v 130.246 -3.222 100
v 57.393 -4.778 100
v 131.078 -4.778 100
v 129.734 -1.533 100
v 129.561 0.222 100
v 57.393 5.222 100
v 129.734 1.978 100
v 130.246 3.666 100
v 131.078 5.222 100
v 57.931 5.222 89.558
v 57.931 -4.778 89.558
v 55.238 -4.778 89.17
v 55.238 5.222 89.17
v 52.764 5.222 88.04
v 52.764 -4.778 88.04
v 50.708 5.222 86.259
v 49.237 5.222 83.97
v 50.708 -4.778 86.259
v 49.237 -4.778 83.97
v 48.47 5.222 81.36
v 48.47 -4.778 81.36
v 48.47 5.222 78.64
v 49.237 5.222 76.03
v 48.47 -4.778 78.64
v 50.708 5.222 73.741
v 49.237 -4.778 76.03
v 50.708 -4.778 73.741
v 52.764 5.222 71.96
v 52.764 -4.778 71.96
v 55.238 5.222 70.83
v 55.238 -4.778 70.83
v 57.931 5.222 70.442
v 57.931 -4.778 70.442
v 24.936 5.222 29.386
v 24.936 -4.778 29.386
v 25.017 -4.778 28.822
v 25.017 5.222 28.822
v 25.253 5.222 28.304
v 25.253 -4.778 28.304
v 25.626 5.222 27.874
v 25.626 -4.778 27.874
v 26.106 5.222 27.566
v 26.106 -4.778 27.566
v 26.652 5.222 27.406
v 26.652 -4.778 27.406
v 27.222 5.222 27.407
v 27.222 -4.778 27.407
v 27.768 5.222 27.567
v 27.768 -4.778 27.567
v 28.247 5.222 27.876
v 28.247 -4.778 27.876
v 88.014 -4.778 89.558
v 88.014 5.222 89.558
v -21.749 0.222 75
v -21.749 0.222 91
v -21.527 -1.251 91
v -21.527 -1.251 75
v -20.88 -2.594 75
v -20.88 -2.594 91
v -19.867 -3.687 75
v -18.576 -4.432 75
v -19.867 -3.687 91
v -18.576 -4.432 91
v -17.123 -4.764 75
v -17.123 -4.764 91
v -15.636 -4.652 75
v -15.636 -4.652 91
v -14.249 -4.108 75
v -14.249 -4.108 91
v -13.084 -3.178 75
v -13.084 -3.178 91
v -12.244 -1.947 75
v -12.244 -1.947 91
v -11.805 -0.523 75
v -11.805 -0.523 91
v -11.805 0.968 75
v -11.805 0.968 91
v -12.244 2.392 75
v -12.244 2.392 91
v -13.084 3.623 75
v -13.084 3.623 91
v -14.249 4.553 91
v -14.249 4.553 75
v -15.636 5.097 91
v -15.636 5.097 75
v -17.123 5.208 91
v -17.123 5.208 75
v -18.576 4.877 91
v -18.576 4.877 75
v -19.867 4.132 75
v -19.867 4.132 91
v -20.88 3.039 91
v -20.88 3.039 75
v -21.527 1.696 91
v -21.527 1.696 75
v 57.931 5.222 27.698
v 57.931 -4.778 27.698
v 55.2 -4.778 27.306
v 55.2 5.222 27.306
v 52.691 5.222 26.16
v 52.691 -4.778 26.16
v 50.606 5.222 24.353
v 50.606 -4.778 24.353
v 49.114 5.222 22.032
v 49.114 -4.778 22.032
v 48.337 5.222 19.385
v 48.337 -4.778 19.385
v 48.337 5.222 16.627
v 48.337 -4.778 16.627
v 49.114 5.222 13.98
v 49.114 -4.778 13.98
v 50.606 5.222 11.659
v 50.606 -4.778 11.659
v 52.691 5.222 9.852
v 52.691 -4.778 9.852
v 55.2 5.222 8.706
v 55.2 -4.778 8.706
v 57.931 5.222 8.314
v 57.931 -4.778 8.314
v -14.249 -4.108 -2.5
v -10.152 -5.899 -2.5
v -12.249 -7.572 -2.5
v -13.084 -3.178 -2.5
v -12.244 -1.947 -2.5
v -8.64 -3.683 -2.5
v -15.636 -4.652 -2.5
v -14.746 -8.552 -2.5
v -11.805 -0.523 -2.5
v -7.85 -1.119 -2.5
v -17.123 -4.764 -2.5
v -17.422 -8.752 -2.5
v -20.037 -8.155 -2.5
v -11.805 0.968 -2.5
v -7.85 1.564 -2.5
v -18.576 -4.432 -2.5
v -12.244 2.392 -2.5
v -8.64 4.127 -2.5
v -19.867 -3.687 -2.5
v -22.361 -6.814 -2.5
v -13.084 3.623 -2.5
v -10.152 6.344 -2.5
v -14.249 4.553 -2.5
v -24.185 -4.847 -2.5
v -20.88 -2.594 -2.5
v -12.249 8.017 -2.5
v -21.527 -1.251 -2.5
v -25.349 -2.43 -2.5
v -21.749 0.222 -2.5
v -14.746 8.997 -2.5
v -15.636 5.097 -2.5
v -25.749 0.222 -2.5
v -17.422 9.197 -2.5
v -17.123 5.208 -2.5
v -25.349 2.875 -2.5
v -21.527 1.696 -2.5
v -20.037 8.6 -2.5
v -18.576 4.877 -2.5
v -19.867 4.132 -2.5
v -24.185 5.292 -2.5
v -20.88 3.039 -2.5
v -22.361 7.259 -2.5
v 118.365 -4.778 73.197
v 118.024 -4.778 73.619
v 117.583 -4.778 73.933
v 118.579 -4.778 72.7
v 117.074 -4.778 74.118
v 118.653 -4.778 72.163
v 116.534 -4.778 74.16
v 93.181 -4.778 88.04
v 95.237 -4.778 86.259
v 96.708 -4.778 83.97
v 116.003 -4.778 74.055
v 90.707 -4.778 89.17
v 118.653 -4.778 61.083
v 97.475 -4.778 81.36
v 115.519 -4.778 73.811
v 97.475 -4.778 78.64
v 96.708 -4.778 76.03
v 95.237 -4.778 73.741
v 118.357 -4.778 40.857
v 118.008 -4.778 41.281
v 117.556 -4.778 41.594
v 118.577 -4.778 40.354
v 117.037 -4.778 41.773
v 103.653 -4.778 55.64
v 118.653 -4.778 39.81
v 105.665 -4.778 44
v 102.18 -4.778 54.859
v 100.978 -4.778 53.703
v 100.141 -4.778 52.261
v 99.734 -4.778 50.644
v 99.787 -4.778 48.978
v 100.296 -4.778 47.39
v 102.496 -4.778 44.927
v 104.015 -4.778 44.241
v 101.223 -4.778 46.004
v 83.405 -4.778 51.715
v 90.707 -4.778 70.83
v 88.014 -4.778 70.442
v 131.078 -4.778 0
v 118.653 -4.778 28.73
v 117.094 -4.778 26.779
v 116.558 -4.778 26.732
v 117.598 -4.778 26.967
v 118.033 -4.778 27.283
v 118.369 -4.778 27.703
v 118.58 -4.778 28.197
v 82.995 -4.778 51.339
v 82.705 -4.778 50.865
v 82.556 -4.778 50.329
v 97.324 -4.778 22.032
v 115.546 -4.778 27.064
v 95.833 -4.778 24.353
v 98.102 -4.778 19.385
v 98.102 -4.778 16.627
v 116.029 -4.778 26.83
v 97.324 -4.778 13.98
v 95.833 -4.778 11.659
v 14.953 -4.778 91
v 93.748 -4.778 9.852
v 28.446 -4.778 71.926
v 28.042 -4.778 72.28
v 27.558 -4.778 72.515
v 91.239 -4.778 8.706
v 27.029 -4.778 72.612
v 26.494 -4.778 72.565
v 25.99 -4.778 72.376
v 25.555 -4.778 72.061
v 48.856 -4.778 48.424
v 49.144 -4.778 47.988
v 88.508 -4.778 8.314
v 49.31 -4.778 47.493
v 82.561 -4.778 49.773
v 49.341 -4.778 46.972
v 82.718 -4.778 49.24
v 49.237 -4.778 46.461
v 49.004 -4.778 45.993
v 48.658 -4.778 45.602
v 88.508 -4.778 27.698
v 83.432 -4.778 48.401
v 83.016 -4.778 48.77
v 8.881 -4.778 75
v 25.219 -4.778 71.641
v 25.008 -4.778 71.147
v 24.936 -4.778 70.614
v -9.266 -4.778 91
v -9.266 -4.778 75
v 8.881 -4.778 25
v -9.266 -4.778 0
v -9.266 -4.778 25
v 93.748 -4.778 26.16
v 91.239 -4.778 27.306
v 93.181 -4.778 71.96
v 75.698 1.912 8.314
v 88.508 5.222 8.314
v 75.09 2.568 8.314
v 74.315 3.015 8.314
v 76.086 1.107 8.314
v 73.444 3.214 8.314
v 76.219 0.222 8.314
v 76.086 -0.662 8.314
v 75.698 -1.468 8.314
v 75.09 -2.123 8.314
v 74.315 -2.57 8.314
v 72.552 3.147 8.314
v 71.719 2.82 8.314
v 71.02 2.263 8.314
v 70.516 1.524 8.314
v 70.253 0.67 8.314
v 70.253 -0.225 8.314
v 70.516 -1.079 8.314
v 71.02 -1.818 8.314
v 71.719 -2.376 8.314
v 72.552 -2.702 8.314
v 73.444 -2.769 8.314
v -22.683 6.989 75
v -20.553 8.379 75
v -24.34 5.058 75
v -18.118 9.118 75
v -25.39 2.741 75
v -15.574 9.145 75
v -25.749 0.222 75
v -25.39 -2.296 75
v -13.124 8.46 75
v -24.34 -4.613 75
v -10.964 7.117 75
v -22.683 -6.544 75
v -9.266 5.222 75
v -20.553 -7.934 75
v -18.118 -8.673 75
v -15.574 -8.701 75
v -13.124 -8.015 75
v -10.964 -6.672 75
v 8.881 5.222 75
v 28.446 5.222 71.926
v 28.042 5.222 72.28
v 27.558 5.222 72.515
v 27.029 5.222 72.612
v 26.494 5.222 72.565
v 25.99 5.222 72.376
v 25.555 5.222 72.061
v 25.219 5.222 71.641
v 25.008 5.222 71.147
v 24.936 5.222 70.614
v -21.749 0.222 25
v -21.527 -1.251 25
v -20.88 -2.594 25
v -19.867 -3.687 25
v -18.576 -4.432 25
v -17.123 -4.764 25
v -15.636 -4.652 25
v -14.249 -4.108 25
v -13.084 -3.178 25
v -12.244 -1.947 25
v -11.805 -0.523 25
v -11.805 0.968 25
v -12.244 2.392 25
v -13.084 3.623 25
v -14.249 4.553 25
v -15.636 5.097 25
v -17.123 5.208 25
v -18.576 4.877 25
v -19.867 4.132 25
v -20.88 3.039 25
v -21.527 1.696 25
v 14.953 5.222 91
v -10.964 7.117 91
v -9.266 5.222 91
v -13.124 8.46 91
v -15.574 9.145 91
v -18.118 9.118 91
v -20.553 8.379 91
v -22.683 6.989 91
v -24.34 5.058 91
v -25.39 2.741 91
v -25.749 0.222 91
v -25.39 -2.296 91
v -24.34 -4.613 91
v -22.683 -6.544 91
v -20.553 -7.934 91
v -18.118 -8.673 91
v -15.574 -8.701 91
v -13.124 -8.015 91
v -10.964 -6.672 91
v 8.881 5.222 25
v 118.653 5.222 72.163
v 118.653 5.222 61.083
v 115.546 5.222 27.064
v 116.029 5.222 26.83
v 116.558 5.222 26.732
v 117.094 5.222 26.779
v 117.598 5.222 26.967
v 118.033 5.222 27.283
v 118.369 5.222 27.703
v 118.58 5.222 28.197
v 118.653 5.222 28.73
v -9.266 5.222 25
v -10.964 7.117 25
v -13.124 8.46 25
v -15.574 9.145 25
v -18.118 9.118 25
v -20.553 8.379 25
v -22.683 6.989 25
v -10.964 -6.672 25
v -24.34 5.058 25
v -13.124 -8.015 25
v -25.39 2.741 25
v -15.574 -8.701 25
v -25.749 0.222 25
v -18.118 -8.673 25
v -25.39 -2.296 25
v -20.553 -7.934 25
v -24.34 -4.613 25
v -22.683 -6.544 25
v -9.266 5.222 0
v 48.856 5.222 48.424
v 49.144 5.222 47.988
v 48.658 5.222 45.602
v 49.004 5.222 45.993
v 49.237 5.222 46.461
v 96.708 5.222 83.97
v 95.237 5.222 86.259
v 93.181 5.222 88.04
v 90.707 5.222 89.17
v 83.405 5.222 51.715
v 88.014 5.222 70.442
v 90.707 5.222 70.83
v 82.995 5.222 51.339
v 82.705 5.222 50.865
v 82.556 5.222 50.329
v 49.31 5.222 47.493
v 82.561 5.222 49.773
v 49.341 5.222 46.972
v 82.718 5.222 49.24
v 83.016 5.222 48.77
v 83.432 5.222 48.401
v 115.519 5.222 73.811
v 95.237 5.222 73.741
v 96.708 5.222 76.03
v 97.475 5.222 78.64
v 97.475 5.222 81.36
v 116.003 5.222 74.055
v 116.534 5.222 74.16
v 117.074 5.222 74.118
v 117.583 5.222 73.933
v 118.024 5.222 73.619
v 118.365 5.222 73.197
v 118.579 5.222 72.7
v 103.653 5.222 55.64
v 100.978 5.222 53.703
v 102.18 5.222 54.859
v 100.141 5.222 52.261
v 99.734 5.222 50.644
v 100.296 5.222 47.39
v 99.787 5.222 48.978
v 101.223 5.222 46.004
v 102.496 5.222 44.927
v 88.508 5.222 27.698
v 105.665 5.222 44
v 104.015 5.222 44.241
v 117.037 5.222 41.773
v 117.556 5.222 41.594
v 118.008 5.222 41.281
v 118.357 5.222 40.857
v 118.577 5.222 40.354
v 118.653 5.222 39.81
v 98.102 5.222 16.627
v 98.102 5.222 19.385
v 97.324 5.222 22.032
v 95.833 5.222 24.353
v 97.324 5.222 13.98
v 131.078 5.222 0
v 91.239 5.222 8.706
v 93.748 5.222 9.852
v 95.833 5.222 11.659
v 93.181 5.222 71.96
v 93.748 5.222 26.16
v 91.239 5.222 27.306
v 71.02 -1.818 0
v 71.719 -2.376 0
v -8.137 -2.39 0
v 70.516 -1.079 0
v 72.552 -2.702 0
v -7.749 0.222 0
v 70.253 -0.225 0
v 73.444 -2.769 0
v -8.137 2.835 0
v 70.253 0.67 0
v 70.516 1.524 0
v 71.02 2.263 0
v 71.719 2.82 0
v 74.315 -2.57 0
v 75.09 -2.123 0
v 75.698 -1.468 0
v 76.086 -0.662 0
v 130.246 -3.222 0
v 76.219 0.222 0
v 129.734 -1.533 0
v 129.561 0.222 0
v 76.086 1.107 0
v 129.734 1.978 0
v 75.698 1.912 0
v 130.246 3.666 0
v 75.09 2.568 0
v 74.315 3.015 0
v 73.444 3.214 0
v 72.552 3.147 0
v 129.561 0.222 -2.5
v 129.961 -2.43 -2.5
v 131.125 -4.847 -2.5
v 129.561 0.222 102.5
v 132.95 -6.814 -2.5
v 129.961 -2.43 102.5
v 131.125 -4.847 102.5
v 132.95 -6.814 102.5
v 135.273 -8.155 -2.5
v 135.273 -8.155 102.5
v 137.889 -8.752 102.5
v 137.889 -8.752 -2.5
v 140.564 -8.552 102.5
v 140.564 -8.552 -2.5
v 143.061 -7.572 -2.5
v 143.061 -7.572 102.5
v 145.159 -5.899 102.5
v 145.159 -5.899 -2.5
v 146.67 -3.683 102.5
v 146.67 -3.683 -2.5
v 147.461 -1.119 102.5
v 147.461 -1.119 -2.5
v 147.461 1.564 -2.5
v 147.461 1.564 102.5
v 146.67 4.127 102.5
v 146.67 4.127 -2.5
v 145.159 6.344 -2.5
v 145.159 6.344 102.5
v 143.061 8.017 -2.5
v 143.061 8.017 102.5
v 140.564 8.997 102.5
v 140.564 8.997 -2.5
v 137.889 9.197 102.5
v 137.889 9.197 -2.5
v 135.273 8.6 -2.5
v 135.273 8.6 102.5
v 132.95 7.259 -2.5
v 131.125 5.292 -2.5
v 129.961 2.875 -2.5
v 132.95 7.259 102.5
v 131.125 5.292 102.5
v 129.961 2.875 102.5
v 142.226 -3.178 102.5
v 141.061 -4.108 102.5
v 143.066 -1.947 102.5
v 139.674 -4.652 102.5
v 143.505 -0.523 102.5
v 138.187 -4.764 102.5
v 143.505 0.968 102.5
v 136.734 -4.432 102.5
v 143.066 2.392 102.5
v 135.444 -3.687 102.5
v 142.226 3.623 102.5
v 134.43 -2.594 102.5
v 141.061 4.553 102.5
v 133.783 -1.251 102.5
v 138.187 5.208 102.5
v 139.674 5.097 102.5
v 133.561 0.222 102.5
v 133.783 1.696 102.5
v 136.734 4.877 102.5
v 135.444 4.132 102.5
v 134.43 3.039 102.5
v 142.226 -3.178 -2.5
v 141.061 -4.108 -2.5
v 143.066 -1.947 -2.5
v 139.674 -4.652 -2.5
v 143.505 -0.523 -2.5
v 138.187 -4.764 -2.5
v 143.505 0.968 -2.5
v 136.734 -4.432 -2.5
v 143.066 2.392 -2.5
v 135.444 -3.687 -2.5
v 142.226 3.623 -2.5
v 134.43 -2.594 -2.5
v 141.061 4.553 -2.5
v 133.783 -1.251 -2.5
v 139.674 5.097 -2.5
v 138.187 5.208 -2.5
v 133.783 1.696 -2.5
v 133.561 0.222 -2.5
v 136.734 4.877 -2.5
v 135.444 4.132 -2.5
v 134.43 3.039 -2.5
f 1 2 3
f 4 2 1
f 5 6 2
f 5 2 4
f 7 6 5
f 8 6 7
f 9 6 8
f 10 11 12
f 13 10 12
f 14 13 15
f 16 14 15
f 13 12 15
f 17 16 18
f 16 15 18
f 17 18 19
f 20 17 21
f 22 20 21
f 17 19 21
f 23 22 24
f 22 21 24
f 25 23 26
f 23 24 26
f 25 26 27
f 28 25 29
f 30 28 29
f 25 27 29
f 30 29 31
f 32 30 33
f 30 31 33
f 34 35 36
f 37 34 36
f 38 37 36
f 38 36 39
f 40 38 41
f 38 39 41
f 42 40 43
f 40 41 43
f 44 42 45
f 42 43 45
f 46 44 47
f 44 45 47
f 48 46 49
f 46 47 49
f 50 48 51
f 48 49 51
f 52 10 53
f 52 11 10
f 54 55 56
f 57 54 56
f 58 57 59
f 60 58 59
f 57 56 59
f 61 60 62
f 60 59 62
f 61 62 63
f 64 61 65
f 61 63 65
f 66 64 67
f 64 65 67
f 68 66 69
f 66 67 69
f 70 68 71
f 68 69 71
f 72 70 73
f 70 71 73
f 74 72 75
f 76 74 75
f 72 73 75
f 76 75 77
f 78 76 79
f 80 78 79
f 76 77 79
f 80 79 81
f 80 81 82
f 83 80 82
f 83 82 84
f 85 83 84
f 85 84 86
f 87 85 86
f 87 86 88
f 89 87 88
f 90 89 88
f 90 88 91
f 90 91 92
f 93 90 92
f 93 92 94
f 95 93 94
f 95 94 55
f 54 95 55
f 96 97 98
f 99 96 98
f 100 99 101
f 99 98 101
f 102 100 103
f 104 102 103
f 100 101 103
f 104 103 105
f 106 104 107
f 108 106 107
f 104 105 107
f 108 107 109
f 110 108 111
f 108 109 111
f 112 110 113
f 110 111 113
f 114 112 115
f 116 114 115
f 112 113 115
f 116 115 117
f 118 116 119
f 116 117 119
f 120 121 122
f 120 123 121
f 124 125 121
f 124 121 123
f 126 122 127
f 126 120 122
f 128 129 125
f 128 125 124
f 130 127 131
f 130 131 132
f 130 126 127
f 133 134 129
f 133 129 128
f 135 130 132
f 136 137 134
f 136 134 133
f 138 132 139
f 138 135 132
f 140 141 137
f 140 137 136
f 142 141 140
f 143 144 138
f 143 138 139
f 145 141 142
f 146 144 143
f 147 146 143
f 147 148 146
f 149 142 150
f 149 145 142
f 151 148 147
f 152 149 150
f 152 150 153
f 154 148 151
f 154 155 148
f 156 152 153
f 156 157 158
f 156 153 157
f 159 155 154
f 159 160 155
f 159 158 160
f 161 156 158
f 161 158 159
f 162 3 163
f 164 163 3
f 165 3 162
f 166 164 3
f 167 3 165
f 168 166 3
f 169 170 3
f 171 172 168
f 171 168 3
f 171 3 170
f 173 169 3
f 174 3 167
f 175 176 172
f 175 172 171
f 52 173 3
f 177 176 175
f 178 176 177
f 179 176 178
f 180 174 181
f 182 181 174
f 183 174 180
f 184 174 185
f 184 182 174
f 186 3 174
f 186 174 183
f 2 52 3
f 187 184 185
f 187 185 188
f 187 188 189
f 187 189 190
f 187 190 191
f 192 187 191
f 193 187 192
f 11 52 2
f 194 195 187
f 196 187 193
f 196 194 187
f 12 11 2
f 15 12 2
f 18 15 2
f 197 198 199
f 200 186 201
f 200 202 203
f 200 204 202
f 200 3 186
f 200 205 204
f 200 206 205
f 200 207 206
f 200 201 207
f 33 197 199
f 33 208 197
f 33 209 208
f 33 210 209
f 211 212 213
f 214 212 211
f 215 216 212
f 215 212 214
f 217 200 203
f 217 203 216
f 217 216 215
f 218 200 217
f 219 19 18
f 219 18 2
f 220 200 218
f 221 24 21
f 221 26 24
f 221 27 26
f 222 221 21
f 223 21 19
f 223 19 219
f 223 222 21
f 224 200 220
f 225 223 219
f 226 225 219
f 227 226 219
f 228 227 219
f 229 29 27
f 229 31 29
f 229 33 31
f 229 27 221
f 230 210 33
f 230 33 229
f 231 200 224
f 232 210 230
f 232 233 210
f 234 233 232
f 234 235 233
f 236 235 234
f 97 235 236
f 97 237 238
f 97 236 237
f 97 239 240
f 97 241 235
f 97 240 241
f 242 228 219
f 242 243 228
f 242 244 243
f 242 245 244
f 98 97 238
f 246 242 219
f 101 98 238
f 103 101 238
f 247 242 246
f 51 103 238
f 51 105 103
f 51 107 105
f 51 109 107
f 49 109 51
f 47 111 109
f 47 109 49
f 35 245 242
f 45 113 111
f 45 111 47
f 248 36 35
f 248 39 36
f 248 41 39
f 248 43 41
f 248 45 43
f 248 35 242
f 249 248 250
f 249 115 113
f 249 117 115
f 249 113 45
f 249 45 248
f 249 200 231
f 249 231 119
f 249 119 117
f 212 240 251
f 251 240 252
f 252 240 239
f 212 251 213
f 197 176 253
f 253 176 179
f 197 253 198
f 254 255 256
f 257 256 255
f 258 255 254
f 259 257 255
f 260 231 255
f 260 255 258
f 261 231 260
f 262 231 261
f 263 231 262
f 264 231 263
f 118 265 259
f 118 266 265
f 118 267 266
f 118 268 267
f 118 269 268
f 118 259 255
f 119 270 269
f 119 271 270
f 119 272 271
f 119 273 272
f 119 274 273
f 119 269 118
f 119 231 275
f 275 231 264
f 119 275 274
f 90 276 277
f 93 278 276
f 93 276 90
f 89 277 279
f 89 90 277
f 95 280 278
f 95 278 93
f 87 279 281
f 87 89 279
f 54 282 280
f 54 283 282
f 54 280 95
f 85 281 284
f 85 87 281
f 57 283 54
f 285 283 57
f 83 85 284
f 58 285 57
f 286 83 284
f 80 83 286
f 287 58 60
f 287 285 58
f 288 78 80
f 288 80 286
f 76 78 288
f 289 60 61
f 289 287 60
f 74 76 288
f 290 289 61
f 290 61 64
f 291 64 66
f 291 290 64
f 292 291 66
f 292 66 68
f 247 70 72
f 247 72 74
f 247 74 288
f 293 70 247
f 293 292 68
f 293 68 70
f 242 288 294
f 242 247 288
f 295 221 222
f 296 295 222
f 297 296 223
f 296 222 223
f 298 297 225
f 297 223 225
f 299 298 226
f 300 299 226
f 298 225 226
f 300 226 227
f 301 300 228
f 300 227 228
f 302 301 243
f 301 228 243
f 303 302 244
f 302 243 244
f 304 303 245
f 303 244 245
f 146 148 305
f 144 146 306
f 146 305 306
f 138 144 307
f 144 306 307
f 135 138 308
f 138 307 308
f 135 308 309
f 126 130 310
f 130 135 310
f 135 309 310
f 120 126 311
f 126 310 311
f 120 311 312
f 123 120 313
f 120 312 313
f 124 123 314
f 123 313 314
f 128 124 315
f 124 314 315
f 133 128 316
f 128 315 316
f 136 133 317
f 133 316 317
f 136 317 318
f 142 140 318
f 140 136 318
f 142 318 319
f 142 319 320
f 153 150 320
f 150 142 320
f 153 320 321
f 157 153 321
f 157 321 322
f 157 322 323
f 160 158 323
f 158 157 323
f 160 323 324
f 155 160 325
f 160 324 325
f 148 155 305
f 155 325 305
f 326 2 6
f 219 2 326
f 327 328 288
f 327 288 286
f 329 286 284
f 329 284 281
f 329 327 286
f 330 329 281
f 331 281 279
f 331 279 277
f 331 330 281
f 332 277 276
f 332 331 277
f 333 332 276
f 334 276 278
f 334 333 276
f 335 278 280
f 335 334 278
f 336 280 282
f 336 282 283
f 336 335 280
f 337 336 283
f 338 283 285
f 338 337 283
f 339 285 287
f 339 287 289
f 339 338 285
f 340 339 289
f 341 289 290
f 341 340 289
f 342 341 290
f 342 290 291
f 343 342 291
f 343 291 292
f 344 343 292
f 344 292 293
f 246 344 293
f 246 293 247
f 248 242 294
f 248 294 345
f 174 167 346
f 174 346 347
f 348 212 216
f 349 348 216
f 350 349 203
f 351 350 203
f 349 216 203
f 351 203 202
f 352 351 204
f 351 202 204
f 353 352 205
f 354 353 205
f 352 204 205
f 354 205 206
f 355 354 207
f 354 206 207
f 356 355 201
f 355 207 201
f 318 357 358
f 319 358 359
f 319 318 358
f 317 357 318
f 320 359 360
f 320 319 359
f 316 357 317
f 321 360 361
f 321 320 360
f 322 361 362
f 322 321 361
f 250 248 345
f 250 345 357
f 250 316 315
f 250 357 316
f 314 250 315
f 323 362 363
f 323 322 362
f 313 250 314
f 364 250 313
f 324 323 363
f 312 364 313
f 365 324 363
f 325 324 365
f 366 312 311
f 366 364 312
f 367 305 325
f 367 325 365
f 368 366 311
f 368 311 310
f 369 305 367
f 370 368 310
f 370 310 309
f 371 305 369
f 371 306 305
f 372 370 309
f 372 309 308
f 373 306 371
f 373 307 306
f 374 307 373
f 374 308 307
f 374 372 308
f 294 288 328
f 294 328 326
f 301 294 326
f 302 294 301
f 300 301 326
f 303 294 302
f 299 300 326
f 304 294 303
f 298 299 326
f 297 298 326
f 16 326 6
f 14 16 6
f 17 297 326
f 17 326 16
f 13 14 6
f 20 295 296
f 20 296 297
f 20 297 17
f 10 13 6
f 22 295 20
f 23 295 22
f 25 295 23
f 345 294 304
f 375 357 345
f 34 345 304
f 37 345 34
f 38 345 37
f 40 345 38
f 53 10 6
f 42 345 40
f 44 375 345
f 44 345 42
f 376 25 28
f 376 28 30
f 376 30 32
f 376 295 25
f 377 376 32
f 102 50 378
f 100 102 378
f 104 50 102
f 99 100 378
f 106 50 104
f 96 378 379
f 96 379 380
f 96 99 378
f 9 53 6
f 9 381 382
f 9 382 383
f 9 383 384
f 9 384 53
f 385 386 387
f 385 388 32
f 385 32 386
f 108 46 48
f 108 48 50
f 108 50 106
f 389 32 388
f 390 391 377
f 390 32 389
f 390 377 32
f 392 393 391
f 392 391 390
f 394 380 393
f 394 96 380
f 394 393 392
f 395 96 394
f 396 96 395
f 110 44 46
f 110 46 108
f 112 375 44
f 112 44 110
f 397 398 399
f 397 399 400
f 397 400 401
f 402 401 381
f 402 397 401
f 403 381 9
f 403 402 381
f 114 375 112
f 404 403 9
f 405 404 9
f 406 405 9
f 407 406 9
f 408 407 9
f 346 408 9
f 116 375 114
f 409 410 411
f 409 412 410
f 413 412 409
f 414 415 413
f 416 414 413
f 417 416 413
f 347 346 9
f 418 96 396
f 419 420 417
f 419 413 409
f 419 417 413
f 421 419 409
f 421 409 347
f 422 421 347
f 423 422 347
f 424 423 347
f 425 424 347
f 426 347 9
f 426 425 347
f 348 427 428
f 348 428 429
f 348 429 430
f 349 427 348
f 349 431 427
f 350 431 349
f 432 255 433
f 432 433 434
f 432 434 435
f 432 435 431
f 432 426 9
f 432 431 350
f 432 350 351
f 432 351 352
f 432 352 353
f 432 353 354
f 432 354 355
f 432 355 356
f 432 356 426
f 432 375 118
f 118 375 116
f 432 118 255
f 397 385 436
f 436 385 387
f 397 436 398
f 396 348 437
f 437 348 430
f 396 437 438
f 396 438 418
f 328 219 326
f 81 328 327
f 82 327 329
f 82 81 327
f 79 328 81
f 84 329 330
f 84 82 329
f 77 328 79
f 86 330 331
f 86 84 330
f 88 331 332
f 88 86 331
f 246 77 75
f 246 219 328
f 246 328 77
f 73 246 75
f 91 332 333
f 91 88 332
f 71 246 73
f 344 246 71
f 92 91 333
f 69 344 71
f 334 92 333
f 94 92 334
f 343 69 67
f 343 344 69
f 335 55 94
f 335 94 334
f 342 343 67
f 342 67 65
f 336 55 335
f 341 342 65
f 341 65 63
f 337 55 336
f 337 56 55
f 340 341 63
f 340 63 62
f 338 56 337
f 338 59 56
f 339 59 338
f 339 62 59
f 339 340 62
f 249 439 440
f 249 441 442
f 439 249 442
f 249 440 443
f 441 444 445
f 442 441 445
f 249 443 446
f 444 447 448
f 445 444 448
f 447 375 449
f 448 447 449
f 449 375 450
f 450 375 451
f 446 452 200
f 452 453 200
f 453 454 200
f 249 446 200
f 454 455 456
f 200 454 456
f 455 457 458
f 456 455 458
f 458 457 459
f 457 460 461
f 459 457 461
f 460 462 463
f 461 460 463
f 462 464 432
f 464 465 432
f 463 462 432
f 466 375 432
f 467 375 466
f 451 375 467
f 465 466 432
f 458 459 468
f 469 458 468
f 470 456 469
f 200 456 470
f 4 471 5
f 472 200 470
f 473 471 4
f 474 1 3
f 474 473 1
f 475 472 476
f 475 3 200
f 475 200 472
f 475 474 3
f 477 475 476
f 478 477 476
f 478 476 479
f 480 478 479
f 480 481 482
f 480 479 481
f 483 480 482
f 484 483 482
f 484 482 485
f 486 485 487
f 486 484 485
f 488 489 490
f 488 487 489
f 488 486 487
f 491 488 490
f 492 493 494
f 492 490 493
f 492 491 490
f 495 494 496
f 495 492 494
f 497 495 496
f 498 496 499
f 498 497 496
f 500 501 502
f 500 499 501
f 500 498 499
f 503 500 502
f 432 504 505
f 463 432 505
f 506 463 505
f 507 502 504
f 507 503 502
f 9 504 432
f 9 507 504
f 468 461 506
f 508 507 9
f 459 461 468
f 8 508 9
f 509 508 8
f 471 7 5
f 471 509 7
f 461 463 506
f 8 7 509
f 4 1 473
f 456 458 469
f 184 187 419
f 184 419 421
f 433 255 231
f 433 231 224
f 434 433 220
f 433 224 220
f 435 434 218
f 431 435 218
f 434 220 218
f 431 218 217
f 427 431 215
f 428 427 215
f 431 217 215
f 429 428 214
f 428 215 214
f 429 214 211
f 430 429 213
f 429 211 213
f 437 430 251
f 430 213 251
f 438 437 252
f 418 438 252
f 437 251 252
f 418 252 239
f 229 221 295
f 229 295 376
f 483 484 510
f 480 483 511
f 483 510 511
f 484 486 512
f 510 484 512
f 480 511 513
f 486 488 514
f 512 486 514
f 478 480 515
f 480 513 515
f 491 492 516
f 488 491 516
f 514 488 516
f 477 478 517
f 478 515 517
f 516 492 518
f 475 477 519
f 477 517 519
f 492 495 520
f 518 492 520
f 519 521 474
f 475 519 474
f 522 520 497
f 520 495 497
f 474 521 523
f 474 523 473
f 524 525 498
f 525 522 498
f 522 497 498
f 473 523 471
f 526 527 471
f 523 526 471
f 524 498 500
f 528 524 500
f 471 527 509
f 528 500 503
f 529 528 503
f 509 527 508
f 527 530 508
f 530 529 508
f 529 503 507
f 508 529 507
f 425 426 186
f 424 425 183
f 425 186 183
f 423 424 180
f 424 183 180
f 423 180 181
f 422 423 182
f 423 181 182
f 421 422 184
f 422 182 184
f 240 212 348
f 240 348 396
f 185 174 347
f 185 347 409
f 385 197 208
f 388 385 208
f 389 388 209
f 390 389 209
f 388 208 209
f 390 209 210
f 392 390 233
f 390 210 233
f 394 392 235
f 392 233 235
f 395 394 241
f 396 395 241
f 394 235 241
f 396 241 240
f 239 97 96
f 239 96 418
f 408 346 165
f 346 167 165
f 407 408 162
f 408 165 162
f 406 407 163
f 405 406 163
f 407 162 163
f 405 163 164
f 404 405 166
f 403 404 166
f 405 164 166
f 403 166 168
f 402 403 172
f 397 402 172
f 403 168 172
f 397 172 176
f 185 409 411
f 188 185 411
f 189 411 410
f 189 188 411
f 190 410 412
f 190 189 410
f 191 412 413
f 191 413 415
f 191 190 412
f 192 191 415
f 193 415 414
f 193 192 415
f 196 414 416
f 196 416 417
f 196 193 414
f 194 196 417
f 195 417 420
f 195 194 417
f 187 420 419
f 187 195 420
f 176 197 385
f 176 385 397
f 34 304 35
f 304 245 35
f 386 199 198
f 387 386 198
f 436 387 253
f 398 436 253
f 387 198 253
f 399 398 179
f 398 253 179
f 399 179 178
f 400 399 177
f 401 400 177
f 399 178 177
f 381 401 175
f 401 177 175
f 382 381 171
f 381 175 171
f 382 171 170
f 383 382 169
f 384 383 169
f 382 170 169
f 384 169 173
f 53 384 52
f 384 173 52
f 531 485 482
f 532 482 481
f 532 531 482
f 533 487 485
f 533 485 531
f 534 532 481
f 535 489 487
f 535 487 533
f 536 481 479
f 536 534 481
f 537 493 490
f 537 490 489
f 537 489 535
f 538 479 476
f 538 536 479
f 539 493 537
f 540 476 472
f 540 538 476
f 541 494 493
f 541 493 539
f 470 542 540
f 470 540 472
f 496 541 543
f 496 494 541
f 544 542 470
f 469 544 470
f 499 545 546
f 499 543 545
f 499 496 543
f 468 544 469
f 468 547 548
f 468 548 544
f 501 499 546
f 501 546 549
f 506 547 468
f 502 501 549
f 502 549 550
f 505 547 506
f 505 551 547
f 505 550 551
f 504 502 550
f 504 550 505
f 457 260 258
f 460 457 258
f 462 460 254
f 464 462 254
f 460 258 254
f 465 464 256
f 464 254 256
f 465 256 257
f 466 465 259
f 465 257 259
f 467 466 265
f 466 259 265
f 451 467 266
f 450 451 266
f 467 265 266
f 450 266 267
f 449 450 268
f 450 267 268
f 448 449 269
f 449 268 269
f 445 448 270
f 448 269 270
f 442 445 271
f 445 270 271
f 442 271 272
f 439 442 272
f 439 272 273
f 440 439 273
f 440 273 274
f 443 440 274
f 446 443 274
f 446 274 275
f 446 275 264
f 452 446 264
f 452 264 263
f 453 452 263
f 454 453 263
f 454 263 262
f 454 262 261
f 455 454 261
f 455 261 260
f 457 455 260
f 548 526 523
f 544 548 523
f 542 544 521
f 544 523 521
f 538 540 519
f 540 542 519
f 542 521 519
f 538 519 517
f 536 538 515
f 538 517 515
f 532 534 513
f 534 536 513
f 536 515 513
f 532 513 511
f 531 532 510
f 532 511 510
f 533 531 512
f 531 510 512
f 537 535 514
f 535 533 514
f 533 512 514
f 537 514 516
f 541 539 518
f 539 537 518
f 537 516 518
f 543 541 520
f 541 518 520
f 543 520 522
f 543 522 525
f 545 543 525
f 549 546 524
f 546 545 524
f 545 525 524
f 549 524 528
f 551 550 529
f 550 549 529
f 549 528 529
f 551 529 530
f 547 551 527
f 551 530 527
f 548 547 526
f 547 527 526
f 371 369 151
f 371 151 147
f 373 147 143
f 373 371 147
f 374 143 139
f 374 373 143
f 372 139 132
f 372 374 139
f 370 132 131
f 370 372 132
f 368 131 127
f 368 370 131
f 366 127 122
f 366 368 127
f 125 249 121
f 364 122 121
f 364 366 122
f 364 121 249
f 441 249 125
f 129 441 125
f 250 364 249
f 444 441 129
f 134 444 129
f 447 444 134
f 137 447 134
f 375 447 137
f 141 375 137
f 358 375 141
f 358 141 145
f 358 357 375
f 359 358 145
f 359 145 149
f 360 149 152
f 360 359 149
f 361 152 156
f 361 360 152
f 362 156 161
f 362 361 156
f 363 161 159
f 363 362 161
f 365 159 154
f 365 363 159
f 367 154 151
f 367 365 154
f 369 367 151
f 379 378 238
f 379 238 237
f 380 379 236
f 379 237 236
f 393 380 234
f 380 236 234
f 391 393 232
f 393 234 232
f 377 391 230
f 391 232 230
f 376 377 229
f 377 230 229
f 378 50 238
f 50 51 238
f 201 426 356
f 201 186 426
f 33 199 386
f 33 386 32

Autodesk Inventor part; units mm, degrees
ref_plane "YZ Plane" through (0, 0, 0) normal (1, 0, 0) x (0, 1, 0)
ref_plane "XZ Plane" through (0, 0, 0) normal (0, 1, 0) x (-1, 0, 0)
sketch "Boceto2" plane through (0, 0, 0) normal (0, 0, 1) x (1, 0, 0)
  circle A0 centre (-16.7491, 0.2224) radius 9
  circle A1 centre (138.5611, 0.2224) radius 9
  line L0 (-9.2658, 5.2224) -> (131.0778, 5.2224)
  line L1 (131.0778, -4.7776) -> (-9.2658, -4.7776)
  circle A2 centre (138.5611, 0.2224) radius 5
  circle A3 centre (-16.7491, 0.2224) radius 5
  point P0 (0, 0)
  dimension "d2" = 18
  dimension "d3" = 10
  dimension "d4" = 10
extrude "Extrusión1" add sketch "Boceto2" along normal blind 100 contours A0 L0 A1 L1
ref_plane "Plano de trabajo1" through (0, 0, 50) normal (0, 0, -1) x (-1, 0, 0)
sketch "Boceto3" plane through (0, 0, 50) normal (0, 0, -1) x (-1, 0, 0)
  circle A0 centre (-138.5611, 0.2224) radius 9 projected
  circle A1 centre (16.7491, 0.2224) radius 9 projected
  circle A2 centre (-138.5611, 0.2224) radius 5 projected
  circle A3 centre (16.7491, 0.2224) radius 5 projected
  point P0 (0, 0)
extrude "Extrusión2" add sketch "Boceto3" along normal mid plane 105
sketch "Boceto4" plane through (0, 0, 0) normal (0, 1, 0) x (-1, 0, 0)
  line L0 (25.7491, 102.5) -> (25.7491, -2.5) projected
  line L1 (9.2658, 0) -> (-131.0778, 0) projected
  line L2 (9.2658, 100) -> (-131.0778, 100) projected
  line L3 (-147.5611, 102.5) -> (-147.5611, -2.5) projected
  line L4 (25.7491, 9) -> (-14.9531, 9)
  line L5 (-14.9531, 9) -> (-57.3933, 0)
  line L6 (9.2658, 0) -> (-131.0778, 0) projected
  line L7 (-57.3933, 100) -> (-14.9531, 91)
  line L8 (-14.9531, 91) -> (25.7491, 91)
  line L9 (25.7491, 75) -> (-8.8807, 75)
  line L10 (-8.8807, 75) -> (-8.8807, 25)
  line L11 (-8.8807, 25) -> (25.7491, 25)
  line L12 (-24.9356, 70.614) -> (-24.9356, 29.386)
  line L13 (-83.4051, 51.7146) -> (-115.5189, 73.8108)
  line L14 (-118.6526, 72.1632) -> (-118.6526, 61.0832)
  line L15 (-118.6526, 39.8101) -> (-118.6526, 28.73)
  line L16 (-115.5457, 27.0642) -> (-83.4319, 48.4011)
  line L17 (-28.4456, 71.9255) -> (-48.8564, 48.4239)
  line L18 (-28.247, 27.8759) -> (-48.6578, 45.6025)
  line L19 (-57.9307, 80) -> (-88.0143, 80) construction
  line L20 (-57.9307, 89.5575) -> (-88.0143, 89.5575)
  line L21 (-88.0143, 70.4425) -> (-57.9307, 70.4425)
  arc A0 (-57.9307, 70.4425) -> (-57.9307, 89.5575) centre (-57.9307, 80) ccw
  arc A1 (-88.0143, 89.5575) -> (-88.0143, 70.4425) centre (-88.0143, 80) ccw
  line L22 (-57.9307, 18.0061) -> (-88.508, 18.0061) construction
  line L23 (-57.9307, 27.6984) -> (-88.508, 27.6984)
  line L24 (-88.508, 8.3137) -> (-57.9307, 8.3137)
  arc A2 (-57.9307, 8.3137) -> (-57.9307, 27.6984) centre (-57.9307, 18.0061) ccw
  arc A3 (-88.508, 27.6984) -> (-88.508, 8.3137) centre (-88.508, 18.0061) ccw
  line L25 (-118.6526, 61.0832) -> (-103.6526, 55.6402)
  arc A4 (-105.6651, 44.0001) -> (-103.6526, 55.6402) centre (-105.6992, 50) ccw
  line L26 (-105.6651, 44.0001) -> (-117.037, 41.7728)
  arc A5 (-115.5189, 73.8108) -> (-118.6526, 72.1632) centre (-116.6526, 72.1632) ccw
  arc A6 (-83.4319, 48.4011) -> (-83.4051, 51.7146) centre (-84.5388, 50.0669) ccw
  arc A7 (-118.6526, 28.73) -> (-115.5457, 27.0642) centre (-116.6526, 28.73) ccw
  arc A8 (-117.037, 41.7728) -> (-118.6526, 39.8101) centre (-116.6526, 39.8101) ccw
  arc A9 (-28.247, 27.8759) -> (-24.9356, 29.386) centre (-26.9356, 29.386) ccw
  arc A10 (-24.9356, 70.614) -> (-28.4456, 71.9255) centre (-26.9356, 70.614) ccw
  arc A11 (-48.8564, 48.4239) -> (-48.6578, 45.6025) centre (-47.3464, 47.1125) ccw
  line L27 (25.7491, 100) -> (25.7491, 91)
  line L28 (7.7491, 102.5) -> (7.7491, -2.5) projected
  line L29 (-57.3933, 100) -> (7.7491, 100)
  line L30 (7.7491, 102.5) -> (25.7491, 102.5)
  line L31 (25.7491, 102.5) -> (7.7491, 102.5) projected
  point P0 (0, 0)
  point P1 (-24.9356, 75.967)
  point P2 (-24.9356, 25)
  point P3 (-80.9683, 50.038)
  point P4 (-118.6526, 75.967)
  point P5 (-118.6526, 41.4563)
  point P6 (-118.6526, 25)
  point P7 (-8.8807, 50)
  point P8 (25.7491, 50)
  point P9 (-24.9356, 50)
  point P10 (-50.1679, 46.9139)
  point P11 (-72.9725, 80)
  point P12 (-73.2193, 18.0061)
  point P13 (-147.5611, 50)
  dimension "d11" = 50
  dimension "d12" = 16
  dimension "d14" = 16
  dimension "d26" = 2
  dimension "d27" = 2
  dimension "d28" = 6
  dimension "d29" = 15
extrude "Extrusión4" cut sketch "Boceto4" along normal through all both and the other way through all contours L0 L8 L28 L30 | L28 L8 L7 L2 | L0 L11 L28 L9 | L28 L11 L10 L9 | L12 A9 L18 A11 L17 A10 | A6 L16 A7 L15 A8 L26 A4 L25 L14 A5 L13 | A0 L21 A1 L20 | A2 L24 A3 L23
sketch "Boceto5" plane through (57.9307, 5.2224, 8.3137) normal (0, 0, 1) x (1, 0, 0)
  line L0 (0, 0) -> (30.5774, 0) projected
  line L1 (0, -10) -> (0, 0) projected
  line L2 (30.5774, -10) -> (0, -10) projected
  line L3 (30.5774, -10) -> (30.5774, 0) projected
  circle A0 centre (15.2887, -5) radius 3
  line L4 (0, 0) -> (30.5774, 0) projected
  line L5 (0, -10) -> (0, 0) projected
  point P0 (-57.9307, -5.2224)
  point P1 (15.2887, 0)
  point P2 (0, -5)
  dimension "d32" = 6
extrude "Extrusión5" cut sketch "Boceto5" against normal through all contours A0
properties part number "Left_upper_part" material "Acero, suave"
